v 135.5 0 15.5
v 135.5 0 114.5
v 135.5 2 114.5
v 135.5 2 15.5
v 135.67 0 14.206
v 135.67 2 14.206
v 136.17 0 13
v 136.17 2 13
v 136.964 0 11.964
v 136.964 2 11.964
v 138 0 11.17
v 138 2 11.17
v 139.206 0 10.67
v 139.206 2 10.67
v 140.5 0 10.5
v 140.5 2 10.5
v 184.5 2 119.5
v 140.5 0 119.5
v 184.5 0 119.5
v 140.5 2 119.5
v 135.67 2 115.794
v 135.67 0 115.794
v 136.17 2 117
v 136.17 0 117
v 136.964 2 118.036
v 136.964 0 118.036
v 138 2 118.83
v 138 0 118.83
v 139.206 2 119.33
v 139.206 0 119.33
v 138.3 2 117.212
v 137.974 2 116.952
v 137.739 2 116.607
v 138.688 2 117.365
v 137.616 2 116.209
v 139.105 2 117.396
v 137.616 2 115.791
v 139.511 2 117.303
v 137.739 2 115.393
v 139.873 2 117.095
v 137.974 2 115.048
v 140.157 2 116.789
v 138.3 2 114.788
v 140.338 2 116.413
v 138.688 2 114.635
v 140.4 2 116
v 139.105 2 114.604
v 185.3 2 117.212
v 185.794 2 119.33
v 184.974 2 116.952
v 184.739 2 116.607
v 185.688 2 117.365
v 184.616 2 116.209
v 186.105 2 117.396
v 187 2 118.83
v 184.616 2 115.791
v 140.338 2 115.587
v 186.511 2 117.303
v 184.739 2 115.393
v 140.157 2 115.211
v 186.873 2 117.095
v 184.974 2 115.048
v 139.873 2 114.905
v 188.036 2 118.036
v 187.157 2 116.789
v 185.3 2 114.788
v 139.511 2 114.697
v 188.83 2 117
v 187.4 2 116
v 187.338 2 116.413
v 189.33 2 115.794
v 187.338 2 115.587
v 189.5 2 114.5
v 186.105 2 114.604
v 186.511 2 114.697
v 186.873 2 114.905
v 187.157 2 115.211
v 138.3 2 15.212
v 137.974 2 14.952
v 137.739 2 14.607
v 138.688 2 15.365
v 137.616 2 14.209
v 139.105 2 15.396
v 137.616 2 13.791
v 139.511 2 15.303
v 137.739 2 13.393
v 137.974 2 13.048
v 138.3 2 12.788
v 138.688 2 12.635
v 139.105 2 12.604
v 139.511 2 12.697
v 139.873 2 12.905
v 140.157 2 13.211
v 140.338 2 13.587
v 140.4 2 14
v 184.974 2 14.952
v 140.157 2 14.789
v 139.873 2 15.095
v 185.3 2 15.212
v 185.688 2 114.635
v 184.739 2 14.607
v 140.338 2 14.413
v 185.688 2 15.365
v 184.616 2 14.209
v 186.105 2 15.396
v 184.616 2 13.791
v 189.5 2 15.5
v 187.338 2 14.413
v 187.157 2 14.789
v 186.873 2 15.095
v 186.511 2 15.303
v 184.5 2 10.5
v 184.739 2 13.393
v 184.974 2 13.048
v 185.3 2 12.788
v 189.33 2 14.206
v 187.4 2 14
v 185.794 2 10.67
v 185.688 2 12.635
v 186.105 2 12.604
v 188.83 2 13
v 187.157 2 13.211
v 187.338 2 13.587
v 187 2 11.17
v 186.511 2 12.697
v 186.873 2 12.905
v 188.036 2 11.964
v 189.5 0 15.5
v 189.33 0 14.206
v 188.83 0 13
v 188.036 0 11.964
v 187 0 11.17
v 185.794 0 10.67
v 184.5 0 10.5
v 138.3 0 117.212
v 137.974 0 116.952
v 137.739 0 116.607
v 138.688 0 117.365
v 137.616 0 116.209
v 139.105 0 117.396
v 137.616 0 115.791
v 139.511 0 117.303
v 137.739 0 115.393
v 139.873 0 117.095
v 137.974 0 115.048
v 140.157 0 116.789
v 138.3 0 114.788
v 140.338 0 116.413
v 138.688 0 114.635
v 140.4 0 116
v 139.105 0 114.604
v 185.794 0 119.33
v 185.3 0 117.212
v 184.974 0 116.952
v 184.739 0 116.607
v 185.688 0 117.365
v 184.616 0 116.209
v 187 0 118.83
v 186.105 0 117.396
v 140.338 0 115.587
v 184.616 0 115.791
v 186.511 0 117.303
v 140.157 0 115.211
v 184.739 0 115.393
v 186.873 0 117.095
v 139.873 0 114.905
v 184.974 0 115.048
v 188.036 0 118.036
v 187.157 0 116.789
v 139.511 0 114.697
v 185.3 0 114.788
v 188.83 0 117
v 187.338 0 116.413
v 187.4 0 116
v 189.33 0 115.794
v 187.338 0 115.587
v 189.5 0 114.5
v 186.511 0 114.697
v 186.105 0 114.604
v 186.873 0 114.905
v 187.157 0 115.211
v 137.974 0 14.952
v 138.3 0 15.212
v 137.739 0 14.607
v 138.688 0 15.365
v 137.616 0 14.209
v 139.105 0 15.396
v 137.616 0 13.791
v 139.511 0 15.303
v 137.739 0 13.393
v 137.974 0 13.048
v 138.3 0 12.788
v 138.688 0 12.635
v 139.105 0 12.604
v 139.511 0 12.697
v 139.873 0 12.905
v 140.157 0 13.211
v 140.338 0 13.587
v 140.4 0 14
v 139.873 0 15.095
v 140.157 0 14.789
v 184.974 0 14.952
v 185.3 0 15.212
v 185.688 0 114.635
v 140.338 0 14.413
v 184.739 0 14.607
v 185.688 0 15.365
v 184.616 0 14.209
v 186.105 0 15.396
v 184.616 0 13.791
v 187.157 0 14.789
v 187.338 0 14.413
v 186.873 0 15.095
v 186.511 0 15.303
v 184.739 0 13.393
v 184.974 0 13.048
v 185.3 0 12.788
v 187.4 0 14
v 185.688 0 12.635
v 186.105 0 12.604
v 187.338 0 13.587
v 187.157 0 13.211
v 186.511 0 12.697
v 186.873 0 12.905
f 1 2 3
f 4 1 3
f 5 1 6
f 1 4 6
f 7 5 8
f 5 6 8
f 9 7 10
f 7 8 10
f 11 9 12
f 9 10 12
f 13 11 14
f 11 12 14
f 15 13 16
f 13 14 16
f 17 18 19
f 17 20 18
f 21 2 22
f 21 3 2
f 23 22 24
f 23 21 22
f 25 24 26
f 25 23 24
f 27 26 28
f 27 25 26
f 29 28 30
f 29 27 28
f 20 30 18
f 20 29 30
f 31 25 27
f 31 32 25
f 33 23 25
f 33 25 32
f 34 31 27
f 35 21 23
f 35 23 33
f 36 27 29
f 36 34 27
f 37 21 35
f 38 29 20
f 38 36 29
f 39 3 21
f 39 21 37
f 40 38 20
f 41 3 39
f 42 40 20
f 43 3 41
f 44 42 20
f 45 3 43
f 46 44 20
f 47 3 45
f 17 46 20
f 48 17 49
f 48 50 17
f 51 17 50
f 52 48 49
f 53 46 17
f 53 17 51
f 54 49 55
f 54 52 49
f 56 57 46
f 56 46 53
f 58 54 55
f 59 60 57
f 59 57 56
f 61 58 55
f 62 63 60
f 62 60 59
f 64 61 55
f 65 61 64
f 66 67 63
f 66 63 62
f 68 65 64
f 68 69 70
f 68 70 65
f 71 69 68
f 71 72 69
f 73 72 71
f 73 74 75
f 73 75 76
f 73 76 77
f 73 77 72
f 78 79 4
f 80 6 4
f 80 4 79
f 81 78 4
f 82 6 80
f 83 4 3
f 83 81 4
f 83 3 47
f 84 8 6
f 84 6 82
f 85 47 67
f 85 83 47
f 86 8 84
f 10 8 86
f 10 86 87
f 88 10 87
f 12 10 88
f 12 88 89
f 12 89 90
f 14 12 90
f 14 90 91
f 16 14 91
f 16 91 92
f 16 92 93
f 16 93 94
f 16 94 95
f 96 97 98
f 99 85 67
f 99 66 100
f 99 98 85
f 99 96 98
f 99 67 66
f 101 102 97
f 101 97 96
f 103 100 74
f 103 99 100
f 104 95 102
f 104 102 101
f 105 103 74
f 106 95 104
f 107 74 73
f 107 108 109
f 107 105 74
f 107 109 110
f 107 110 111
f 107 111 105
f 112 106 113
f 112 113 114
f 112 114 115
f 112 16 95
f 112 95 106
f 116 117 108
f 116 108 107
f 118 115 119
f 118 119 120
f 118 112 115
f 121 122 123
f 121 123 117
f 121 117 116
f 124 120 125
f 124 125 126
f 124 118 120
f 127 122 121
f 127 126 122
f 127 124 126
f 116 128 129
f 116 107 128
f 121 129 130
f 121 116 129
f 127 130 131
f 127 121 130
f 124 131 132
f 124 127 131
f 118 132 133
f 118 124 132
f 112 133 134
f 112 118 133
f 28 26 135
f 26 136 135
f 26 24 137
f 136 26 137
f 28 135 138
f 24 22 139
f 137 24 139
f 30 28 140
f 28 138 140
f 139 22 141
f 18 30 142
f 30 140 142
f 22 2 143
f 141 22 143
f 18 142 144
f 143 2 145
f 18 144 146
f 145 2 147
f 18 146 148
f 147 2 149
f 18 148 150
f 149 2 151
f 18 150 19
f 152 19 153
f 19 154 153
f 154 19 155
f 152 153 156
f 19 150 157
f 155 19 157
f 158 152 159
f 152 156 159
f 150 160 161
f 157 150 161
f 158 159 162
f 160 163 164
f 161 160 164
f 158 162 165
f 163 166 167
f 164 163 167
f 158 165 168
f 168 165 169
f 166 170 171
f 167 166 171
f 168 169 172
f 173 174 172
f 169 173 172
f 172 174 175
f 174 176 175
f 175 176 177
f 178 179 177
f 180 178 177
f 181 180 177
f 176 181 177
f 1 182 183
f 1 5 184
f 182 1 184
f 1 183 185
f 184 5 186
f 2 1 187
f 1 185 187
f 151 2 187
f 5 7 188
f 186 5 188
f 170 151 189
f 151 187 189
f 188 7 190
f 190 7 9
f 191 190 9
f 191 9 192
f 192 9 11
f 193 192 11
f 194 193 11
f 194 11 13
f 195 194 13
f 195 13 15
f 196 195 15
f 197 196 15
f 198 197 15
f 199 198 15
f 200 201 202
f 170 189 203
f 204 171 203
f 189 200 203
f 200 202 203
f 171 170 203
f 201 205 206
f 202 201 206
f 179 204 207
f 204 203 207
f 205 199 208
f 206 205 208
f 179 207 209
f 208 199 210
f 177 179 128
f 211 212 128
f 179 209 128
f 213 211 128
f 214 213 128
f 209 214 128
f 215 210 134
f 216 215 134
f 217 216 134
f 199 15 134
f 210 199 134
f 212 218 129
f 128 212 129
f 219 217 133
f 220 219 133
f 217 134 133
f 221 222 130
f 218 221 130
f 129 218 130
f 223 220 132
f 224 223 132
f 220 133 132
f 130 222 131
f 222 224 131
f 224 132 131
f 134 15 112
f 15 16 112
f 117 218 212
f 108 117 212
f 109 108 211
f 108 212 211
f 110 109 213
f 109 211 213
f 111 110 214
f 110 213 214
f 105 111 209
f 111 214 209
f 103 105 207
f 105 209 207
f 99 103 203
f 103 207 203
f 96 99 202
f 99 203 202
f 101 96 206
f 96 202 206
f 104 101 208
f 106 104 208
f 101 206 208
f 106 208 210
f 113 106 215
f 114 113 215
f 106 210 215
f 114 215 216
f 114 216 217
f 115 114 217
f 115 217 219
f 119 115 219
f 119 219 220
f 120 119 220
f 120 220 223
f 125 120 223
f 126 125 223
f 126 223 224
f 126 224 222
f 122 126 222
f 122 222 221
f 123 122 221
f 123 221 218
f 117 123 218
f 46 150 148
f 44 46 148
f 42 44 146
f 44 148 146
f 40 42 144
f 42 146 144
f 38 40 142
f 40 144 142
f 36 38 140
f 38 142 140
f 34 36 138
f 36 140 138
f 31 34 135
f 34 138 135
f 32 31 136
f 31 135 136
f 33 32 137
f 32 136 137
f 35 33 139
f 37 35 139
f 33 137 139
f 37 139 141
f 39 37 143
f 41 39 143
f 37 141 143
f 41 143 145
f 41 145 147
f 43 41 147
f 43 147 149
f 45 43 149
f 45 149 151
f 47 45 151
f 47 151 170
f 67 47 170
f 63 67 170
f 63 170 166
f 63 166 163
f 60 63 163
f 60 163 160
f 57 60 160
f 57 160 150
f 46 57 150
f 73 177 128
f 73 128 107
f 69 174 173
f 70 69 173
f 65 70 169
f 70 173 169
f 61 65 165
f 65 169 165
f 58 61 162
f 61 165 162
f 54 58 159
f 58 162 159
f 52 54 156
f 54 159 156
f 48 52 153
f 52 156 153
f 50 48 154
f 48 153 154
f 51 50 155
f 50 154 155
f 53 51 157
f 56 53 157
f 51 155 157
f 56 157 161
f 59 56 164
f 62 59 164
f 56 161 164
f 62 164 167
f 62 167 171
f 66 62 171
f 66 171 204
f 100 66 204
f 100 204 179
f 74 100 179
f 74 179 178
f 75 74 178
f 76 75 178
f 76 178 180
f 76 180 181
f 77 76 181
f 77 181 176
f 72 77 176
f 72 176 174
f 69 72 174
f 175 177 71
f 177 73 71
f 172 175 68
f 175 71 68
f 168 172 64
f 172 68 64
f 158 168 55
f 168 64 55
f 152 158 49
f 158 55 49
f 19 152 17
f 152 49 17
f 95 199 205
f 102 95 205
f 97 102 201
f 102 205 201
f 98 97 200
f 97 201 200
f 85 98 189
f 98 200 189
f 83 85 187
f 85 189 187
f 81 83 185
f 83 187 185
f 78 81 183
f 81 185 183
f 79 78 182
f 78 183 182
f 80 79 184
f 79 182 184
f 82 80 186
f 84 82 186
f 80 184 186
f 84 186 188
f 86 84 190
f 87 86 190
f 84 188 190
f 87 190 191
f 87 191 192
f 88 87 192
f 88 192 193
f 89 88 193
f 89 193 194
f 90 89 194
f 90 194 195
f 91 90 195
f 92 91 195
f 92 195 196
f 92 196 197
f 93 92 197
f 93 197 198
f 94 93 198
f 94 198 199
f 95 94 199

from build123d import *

# Parameters (mm, degrees)
SKETCH003_R  = 1.4
PAD003_DEPTH = 30
BOX013_W     = 54
BOX013_H     = 2
BOX013_DEPTH = 109
FILLET006_R  = 5


with BuildPart() as pad003:
    # Sketch003 → Pad003 (new body)
    with BuildSketch(Plane.XZ.offset(10)):
        with Locations((139, 116)):
            Circle(SKETCH003_R)
        with Locations((186, 116)):
            Circle(SKETCH003_R)
        with Locations((139, 14)):
            Circle(SKETCH003_R)
        with Locations((186, 14)):
            Circle(SKETCH003_R)
    extrude(amount=-PAD003_DEPTH)


with BuildPart() as cut008:
    # Box013 → Box013 (new body)
    with BuildSketch(Plane(origin=(135.5, 0, 10.5), x_dir=(1, 0, 0), z_dir=(0, 0, 1))):
        with Locations((27, 1)):
            Rectangle(BOX013_W, BOX013_H)
    extrude(amount=BOX013_DEPTH)

    # Fillet006
    fillet006_edges = [cut008.edges().sort_by_distance(p)[0] for p in [
        (135.5, 1, 119.5),
        (135.5, 1, 10.5),
        (189.5, 1, 119.5),
        (189.5, 1, 10.5),
    ]]
    fillet(fillet006_edges, radius=FILLET006_R)

    # Cut008: cut Pad003
    add(pad003.part, mode=Mode.SUBTRACT)


solid = cut008.part
